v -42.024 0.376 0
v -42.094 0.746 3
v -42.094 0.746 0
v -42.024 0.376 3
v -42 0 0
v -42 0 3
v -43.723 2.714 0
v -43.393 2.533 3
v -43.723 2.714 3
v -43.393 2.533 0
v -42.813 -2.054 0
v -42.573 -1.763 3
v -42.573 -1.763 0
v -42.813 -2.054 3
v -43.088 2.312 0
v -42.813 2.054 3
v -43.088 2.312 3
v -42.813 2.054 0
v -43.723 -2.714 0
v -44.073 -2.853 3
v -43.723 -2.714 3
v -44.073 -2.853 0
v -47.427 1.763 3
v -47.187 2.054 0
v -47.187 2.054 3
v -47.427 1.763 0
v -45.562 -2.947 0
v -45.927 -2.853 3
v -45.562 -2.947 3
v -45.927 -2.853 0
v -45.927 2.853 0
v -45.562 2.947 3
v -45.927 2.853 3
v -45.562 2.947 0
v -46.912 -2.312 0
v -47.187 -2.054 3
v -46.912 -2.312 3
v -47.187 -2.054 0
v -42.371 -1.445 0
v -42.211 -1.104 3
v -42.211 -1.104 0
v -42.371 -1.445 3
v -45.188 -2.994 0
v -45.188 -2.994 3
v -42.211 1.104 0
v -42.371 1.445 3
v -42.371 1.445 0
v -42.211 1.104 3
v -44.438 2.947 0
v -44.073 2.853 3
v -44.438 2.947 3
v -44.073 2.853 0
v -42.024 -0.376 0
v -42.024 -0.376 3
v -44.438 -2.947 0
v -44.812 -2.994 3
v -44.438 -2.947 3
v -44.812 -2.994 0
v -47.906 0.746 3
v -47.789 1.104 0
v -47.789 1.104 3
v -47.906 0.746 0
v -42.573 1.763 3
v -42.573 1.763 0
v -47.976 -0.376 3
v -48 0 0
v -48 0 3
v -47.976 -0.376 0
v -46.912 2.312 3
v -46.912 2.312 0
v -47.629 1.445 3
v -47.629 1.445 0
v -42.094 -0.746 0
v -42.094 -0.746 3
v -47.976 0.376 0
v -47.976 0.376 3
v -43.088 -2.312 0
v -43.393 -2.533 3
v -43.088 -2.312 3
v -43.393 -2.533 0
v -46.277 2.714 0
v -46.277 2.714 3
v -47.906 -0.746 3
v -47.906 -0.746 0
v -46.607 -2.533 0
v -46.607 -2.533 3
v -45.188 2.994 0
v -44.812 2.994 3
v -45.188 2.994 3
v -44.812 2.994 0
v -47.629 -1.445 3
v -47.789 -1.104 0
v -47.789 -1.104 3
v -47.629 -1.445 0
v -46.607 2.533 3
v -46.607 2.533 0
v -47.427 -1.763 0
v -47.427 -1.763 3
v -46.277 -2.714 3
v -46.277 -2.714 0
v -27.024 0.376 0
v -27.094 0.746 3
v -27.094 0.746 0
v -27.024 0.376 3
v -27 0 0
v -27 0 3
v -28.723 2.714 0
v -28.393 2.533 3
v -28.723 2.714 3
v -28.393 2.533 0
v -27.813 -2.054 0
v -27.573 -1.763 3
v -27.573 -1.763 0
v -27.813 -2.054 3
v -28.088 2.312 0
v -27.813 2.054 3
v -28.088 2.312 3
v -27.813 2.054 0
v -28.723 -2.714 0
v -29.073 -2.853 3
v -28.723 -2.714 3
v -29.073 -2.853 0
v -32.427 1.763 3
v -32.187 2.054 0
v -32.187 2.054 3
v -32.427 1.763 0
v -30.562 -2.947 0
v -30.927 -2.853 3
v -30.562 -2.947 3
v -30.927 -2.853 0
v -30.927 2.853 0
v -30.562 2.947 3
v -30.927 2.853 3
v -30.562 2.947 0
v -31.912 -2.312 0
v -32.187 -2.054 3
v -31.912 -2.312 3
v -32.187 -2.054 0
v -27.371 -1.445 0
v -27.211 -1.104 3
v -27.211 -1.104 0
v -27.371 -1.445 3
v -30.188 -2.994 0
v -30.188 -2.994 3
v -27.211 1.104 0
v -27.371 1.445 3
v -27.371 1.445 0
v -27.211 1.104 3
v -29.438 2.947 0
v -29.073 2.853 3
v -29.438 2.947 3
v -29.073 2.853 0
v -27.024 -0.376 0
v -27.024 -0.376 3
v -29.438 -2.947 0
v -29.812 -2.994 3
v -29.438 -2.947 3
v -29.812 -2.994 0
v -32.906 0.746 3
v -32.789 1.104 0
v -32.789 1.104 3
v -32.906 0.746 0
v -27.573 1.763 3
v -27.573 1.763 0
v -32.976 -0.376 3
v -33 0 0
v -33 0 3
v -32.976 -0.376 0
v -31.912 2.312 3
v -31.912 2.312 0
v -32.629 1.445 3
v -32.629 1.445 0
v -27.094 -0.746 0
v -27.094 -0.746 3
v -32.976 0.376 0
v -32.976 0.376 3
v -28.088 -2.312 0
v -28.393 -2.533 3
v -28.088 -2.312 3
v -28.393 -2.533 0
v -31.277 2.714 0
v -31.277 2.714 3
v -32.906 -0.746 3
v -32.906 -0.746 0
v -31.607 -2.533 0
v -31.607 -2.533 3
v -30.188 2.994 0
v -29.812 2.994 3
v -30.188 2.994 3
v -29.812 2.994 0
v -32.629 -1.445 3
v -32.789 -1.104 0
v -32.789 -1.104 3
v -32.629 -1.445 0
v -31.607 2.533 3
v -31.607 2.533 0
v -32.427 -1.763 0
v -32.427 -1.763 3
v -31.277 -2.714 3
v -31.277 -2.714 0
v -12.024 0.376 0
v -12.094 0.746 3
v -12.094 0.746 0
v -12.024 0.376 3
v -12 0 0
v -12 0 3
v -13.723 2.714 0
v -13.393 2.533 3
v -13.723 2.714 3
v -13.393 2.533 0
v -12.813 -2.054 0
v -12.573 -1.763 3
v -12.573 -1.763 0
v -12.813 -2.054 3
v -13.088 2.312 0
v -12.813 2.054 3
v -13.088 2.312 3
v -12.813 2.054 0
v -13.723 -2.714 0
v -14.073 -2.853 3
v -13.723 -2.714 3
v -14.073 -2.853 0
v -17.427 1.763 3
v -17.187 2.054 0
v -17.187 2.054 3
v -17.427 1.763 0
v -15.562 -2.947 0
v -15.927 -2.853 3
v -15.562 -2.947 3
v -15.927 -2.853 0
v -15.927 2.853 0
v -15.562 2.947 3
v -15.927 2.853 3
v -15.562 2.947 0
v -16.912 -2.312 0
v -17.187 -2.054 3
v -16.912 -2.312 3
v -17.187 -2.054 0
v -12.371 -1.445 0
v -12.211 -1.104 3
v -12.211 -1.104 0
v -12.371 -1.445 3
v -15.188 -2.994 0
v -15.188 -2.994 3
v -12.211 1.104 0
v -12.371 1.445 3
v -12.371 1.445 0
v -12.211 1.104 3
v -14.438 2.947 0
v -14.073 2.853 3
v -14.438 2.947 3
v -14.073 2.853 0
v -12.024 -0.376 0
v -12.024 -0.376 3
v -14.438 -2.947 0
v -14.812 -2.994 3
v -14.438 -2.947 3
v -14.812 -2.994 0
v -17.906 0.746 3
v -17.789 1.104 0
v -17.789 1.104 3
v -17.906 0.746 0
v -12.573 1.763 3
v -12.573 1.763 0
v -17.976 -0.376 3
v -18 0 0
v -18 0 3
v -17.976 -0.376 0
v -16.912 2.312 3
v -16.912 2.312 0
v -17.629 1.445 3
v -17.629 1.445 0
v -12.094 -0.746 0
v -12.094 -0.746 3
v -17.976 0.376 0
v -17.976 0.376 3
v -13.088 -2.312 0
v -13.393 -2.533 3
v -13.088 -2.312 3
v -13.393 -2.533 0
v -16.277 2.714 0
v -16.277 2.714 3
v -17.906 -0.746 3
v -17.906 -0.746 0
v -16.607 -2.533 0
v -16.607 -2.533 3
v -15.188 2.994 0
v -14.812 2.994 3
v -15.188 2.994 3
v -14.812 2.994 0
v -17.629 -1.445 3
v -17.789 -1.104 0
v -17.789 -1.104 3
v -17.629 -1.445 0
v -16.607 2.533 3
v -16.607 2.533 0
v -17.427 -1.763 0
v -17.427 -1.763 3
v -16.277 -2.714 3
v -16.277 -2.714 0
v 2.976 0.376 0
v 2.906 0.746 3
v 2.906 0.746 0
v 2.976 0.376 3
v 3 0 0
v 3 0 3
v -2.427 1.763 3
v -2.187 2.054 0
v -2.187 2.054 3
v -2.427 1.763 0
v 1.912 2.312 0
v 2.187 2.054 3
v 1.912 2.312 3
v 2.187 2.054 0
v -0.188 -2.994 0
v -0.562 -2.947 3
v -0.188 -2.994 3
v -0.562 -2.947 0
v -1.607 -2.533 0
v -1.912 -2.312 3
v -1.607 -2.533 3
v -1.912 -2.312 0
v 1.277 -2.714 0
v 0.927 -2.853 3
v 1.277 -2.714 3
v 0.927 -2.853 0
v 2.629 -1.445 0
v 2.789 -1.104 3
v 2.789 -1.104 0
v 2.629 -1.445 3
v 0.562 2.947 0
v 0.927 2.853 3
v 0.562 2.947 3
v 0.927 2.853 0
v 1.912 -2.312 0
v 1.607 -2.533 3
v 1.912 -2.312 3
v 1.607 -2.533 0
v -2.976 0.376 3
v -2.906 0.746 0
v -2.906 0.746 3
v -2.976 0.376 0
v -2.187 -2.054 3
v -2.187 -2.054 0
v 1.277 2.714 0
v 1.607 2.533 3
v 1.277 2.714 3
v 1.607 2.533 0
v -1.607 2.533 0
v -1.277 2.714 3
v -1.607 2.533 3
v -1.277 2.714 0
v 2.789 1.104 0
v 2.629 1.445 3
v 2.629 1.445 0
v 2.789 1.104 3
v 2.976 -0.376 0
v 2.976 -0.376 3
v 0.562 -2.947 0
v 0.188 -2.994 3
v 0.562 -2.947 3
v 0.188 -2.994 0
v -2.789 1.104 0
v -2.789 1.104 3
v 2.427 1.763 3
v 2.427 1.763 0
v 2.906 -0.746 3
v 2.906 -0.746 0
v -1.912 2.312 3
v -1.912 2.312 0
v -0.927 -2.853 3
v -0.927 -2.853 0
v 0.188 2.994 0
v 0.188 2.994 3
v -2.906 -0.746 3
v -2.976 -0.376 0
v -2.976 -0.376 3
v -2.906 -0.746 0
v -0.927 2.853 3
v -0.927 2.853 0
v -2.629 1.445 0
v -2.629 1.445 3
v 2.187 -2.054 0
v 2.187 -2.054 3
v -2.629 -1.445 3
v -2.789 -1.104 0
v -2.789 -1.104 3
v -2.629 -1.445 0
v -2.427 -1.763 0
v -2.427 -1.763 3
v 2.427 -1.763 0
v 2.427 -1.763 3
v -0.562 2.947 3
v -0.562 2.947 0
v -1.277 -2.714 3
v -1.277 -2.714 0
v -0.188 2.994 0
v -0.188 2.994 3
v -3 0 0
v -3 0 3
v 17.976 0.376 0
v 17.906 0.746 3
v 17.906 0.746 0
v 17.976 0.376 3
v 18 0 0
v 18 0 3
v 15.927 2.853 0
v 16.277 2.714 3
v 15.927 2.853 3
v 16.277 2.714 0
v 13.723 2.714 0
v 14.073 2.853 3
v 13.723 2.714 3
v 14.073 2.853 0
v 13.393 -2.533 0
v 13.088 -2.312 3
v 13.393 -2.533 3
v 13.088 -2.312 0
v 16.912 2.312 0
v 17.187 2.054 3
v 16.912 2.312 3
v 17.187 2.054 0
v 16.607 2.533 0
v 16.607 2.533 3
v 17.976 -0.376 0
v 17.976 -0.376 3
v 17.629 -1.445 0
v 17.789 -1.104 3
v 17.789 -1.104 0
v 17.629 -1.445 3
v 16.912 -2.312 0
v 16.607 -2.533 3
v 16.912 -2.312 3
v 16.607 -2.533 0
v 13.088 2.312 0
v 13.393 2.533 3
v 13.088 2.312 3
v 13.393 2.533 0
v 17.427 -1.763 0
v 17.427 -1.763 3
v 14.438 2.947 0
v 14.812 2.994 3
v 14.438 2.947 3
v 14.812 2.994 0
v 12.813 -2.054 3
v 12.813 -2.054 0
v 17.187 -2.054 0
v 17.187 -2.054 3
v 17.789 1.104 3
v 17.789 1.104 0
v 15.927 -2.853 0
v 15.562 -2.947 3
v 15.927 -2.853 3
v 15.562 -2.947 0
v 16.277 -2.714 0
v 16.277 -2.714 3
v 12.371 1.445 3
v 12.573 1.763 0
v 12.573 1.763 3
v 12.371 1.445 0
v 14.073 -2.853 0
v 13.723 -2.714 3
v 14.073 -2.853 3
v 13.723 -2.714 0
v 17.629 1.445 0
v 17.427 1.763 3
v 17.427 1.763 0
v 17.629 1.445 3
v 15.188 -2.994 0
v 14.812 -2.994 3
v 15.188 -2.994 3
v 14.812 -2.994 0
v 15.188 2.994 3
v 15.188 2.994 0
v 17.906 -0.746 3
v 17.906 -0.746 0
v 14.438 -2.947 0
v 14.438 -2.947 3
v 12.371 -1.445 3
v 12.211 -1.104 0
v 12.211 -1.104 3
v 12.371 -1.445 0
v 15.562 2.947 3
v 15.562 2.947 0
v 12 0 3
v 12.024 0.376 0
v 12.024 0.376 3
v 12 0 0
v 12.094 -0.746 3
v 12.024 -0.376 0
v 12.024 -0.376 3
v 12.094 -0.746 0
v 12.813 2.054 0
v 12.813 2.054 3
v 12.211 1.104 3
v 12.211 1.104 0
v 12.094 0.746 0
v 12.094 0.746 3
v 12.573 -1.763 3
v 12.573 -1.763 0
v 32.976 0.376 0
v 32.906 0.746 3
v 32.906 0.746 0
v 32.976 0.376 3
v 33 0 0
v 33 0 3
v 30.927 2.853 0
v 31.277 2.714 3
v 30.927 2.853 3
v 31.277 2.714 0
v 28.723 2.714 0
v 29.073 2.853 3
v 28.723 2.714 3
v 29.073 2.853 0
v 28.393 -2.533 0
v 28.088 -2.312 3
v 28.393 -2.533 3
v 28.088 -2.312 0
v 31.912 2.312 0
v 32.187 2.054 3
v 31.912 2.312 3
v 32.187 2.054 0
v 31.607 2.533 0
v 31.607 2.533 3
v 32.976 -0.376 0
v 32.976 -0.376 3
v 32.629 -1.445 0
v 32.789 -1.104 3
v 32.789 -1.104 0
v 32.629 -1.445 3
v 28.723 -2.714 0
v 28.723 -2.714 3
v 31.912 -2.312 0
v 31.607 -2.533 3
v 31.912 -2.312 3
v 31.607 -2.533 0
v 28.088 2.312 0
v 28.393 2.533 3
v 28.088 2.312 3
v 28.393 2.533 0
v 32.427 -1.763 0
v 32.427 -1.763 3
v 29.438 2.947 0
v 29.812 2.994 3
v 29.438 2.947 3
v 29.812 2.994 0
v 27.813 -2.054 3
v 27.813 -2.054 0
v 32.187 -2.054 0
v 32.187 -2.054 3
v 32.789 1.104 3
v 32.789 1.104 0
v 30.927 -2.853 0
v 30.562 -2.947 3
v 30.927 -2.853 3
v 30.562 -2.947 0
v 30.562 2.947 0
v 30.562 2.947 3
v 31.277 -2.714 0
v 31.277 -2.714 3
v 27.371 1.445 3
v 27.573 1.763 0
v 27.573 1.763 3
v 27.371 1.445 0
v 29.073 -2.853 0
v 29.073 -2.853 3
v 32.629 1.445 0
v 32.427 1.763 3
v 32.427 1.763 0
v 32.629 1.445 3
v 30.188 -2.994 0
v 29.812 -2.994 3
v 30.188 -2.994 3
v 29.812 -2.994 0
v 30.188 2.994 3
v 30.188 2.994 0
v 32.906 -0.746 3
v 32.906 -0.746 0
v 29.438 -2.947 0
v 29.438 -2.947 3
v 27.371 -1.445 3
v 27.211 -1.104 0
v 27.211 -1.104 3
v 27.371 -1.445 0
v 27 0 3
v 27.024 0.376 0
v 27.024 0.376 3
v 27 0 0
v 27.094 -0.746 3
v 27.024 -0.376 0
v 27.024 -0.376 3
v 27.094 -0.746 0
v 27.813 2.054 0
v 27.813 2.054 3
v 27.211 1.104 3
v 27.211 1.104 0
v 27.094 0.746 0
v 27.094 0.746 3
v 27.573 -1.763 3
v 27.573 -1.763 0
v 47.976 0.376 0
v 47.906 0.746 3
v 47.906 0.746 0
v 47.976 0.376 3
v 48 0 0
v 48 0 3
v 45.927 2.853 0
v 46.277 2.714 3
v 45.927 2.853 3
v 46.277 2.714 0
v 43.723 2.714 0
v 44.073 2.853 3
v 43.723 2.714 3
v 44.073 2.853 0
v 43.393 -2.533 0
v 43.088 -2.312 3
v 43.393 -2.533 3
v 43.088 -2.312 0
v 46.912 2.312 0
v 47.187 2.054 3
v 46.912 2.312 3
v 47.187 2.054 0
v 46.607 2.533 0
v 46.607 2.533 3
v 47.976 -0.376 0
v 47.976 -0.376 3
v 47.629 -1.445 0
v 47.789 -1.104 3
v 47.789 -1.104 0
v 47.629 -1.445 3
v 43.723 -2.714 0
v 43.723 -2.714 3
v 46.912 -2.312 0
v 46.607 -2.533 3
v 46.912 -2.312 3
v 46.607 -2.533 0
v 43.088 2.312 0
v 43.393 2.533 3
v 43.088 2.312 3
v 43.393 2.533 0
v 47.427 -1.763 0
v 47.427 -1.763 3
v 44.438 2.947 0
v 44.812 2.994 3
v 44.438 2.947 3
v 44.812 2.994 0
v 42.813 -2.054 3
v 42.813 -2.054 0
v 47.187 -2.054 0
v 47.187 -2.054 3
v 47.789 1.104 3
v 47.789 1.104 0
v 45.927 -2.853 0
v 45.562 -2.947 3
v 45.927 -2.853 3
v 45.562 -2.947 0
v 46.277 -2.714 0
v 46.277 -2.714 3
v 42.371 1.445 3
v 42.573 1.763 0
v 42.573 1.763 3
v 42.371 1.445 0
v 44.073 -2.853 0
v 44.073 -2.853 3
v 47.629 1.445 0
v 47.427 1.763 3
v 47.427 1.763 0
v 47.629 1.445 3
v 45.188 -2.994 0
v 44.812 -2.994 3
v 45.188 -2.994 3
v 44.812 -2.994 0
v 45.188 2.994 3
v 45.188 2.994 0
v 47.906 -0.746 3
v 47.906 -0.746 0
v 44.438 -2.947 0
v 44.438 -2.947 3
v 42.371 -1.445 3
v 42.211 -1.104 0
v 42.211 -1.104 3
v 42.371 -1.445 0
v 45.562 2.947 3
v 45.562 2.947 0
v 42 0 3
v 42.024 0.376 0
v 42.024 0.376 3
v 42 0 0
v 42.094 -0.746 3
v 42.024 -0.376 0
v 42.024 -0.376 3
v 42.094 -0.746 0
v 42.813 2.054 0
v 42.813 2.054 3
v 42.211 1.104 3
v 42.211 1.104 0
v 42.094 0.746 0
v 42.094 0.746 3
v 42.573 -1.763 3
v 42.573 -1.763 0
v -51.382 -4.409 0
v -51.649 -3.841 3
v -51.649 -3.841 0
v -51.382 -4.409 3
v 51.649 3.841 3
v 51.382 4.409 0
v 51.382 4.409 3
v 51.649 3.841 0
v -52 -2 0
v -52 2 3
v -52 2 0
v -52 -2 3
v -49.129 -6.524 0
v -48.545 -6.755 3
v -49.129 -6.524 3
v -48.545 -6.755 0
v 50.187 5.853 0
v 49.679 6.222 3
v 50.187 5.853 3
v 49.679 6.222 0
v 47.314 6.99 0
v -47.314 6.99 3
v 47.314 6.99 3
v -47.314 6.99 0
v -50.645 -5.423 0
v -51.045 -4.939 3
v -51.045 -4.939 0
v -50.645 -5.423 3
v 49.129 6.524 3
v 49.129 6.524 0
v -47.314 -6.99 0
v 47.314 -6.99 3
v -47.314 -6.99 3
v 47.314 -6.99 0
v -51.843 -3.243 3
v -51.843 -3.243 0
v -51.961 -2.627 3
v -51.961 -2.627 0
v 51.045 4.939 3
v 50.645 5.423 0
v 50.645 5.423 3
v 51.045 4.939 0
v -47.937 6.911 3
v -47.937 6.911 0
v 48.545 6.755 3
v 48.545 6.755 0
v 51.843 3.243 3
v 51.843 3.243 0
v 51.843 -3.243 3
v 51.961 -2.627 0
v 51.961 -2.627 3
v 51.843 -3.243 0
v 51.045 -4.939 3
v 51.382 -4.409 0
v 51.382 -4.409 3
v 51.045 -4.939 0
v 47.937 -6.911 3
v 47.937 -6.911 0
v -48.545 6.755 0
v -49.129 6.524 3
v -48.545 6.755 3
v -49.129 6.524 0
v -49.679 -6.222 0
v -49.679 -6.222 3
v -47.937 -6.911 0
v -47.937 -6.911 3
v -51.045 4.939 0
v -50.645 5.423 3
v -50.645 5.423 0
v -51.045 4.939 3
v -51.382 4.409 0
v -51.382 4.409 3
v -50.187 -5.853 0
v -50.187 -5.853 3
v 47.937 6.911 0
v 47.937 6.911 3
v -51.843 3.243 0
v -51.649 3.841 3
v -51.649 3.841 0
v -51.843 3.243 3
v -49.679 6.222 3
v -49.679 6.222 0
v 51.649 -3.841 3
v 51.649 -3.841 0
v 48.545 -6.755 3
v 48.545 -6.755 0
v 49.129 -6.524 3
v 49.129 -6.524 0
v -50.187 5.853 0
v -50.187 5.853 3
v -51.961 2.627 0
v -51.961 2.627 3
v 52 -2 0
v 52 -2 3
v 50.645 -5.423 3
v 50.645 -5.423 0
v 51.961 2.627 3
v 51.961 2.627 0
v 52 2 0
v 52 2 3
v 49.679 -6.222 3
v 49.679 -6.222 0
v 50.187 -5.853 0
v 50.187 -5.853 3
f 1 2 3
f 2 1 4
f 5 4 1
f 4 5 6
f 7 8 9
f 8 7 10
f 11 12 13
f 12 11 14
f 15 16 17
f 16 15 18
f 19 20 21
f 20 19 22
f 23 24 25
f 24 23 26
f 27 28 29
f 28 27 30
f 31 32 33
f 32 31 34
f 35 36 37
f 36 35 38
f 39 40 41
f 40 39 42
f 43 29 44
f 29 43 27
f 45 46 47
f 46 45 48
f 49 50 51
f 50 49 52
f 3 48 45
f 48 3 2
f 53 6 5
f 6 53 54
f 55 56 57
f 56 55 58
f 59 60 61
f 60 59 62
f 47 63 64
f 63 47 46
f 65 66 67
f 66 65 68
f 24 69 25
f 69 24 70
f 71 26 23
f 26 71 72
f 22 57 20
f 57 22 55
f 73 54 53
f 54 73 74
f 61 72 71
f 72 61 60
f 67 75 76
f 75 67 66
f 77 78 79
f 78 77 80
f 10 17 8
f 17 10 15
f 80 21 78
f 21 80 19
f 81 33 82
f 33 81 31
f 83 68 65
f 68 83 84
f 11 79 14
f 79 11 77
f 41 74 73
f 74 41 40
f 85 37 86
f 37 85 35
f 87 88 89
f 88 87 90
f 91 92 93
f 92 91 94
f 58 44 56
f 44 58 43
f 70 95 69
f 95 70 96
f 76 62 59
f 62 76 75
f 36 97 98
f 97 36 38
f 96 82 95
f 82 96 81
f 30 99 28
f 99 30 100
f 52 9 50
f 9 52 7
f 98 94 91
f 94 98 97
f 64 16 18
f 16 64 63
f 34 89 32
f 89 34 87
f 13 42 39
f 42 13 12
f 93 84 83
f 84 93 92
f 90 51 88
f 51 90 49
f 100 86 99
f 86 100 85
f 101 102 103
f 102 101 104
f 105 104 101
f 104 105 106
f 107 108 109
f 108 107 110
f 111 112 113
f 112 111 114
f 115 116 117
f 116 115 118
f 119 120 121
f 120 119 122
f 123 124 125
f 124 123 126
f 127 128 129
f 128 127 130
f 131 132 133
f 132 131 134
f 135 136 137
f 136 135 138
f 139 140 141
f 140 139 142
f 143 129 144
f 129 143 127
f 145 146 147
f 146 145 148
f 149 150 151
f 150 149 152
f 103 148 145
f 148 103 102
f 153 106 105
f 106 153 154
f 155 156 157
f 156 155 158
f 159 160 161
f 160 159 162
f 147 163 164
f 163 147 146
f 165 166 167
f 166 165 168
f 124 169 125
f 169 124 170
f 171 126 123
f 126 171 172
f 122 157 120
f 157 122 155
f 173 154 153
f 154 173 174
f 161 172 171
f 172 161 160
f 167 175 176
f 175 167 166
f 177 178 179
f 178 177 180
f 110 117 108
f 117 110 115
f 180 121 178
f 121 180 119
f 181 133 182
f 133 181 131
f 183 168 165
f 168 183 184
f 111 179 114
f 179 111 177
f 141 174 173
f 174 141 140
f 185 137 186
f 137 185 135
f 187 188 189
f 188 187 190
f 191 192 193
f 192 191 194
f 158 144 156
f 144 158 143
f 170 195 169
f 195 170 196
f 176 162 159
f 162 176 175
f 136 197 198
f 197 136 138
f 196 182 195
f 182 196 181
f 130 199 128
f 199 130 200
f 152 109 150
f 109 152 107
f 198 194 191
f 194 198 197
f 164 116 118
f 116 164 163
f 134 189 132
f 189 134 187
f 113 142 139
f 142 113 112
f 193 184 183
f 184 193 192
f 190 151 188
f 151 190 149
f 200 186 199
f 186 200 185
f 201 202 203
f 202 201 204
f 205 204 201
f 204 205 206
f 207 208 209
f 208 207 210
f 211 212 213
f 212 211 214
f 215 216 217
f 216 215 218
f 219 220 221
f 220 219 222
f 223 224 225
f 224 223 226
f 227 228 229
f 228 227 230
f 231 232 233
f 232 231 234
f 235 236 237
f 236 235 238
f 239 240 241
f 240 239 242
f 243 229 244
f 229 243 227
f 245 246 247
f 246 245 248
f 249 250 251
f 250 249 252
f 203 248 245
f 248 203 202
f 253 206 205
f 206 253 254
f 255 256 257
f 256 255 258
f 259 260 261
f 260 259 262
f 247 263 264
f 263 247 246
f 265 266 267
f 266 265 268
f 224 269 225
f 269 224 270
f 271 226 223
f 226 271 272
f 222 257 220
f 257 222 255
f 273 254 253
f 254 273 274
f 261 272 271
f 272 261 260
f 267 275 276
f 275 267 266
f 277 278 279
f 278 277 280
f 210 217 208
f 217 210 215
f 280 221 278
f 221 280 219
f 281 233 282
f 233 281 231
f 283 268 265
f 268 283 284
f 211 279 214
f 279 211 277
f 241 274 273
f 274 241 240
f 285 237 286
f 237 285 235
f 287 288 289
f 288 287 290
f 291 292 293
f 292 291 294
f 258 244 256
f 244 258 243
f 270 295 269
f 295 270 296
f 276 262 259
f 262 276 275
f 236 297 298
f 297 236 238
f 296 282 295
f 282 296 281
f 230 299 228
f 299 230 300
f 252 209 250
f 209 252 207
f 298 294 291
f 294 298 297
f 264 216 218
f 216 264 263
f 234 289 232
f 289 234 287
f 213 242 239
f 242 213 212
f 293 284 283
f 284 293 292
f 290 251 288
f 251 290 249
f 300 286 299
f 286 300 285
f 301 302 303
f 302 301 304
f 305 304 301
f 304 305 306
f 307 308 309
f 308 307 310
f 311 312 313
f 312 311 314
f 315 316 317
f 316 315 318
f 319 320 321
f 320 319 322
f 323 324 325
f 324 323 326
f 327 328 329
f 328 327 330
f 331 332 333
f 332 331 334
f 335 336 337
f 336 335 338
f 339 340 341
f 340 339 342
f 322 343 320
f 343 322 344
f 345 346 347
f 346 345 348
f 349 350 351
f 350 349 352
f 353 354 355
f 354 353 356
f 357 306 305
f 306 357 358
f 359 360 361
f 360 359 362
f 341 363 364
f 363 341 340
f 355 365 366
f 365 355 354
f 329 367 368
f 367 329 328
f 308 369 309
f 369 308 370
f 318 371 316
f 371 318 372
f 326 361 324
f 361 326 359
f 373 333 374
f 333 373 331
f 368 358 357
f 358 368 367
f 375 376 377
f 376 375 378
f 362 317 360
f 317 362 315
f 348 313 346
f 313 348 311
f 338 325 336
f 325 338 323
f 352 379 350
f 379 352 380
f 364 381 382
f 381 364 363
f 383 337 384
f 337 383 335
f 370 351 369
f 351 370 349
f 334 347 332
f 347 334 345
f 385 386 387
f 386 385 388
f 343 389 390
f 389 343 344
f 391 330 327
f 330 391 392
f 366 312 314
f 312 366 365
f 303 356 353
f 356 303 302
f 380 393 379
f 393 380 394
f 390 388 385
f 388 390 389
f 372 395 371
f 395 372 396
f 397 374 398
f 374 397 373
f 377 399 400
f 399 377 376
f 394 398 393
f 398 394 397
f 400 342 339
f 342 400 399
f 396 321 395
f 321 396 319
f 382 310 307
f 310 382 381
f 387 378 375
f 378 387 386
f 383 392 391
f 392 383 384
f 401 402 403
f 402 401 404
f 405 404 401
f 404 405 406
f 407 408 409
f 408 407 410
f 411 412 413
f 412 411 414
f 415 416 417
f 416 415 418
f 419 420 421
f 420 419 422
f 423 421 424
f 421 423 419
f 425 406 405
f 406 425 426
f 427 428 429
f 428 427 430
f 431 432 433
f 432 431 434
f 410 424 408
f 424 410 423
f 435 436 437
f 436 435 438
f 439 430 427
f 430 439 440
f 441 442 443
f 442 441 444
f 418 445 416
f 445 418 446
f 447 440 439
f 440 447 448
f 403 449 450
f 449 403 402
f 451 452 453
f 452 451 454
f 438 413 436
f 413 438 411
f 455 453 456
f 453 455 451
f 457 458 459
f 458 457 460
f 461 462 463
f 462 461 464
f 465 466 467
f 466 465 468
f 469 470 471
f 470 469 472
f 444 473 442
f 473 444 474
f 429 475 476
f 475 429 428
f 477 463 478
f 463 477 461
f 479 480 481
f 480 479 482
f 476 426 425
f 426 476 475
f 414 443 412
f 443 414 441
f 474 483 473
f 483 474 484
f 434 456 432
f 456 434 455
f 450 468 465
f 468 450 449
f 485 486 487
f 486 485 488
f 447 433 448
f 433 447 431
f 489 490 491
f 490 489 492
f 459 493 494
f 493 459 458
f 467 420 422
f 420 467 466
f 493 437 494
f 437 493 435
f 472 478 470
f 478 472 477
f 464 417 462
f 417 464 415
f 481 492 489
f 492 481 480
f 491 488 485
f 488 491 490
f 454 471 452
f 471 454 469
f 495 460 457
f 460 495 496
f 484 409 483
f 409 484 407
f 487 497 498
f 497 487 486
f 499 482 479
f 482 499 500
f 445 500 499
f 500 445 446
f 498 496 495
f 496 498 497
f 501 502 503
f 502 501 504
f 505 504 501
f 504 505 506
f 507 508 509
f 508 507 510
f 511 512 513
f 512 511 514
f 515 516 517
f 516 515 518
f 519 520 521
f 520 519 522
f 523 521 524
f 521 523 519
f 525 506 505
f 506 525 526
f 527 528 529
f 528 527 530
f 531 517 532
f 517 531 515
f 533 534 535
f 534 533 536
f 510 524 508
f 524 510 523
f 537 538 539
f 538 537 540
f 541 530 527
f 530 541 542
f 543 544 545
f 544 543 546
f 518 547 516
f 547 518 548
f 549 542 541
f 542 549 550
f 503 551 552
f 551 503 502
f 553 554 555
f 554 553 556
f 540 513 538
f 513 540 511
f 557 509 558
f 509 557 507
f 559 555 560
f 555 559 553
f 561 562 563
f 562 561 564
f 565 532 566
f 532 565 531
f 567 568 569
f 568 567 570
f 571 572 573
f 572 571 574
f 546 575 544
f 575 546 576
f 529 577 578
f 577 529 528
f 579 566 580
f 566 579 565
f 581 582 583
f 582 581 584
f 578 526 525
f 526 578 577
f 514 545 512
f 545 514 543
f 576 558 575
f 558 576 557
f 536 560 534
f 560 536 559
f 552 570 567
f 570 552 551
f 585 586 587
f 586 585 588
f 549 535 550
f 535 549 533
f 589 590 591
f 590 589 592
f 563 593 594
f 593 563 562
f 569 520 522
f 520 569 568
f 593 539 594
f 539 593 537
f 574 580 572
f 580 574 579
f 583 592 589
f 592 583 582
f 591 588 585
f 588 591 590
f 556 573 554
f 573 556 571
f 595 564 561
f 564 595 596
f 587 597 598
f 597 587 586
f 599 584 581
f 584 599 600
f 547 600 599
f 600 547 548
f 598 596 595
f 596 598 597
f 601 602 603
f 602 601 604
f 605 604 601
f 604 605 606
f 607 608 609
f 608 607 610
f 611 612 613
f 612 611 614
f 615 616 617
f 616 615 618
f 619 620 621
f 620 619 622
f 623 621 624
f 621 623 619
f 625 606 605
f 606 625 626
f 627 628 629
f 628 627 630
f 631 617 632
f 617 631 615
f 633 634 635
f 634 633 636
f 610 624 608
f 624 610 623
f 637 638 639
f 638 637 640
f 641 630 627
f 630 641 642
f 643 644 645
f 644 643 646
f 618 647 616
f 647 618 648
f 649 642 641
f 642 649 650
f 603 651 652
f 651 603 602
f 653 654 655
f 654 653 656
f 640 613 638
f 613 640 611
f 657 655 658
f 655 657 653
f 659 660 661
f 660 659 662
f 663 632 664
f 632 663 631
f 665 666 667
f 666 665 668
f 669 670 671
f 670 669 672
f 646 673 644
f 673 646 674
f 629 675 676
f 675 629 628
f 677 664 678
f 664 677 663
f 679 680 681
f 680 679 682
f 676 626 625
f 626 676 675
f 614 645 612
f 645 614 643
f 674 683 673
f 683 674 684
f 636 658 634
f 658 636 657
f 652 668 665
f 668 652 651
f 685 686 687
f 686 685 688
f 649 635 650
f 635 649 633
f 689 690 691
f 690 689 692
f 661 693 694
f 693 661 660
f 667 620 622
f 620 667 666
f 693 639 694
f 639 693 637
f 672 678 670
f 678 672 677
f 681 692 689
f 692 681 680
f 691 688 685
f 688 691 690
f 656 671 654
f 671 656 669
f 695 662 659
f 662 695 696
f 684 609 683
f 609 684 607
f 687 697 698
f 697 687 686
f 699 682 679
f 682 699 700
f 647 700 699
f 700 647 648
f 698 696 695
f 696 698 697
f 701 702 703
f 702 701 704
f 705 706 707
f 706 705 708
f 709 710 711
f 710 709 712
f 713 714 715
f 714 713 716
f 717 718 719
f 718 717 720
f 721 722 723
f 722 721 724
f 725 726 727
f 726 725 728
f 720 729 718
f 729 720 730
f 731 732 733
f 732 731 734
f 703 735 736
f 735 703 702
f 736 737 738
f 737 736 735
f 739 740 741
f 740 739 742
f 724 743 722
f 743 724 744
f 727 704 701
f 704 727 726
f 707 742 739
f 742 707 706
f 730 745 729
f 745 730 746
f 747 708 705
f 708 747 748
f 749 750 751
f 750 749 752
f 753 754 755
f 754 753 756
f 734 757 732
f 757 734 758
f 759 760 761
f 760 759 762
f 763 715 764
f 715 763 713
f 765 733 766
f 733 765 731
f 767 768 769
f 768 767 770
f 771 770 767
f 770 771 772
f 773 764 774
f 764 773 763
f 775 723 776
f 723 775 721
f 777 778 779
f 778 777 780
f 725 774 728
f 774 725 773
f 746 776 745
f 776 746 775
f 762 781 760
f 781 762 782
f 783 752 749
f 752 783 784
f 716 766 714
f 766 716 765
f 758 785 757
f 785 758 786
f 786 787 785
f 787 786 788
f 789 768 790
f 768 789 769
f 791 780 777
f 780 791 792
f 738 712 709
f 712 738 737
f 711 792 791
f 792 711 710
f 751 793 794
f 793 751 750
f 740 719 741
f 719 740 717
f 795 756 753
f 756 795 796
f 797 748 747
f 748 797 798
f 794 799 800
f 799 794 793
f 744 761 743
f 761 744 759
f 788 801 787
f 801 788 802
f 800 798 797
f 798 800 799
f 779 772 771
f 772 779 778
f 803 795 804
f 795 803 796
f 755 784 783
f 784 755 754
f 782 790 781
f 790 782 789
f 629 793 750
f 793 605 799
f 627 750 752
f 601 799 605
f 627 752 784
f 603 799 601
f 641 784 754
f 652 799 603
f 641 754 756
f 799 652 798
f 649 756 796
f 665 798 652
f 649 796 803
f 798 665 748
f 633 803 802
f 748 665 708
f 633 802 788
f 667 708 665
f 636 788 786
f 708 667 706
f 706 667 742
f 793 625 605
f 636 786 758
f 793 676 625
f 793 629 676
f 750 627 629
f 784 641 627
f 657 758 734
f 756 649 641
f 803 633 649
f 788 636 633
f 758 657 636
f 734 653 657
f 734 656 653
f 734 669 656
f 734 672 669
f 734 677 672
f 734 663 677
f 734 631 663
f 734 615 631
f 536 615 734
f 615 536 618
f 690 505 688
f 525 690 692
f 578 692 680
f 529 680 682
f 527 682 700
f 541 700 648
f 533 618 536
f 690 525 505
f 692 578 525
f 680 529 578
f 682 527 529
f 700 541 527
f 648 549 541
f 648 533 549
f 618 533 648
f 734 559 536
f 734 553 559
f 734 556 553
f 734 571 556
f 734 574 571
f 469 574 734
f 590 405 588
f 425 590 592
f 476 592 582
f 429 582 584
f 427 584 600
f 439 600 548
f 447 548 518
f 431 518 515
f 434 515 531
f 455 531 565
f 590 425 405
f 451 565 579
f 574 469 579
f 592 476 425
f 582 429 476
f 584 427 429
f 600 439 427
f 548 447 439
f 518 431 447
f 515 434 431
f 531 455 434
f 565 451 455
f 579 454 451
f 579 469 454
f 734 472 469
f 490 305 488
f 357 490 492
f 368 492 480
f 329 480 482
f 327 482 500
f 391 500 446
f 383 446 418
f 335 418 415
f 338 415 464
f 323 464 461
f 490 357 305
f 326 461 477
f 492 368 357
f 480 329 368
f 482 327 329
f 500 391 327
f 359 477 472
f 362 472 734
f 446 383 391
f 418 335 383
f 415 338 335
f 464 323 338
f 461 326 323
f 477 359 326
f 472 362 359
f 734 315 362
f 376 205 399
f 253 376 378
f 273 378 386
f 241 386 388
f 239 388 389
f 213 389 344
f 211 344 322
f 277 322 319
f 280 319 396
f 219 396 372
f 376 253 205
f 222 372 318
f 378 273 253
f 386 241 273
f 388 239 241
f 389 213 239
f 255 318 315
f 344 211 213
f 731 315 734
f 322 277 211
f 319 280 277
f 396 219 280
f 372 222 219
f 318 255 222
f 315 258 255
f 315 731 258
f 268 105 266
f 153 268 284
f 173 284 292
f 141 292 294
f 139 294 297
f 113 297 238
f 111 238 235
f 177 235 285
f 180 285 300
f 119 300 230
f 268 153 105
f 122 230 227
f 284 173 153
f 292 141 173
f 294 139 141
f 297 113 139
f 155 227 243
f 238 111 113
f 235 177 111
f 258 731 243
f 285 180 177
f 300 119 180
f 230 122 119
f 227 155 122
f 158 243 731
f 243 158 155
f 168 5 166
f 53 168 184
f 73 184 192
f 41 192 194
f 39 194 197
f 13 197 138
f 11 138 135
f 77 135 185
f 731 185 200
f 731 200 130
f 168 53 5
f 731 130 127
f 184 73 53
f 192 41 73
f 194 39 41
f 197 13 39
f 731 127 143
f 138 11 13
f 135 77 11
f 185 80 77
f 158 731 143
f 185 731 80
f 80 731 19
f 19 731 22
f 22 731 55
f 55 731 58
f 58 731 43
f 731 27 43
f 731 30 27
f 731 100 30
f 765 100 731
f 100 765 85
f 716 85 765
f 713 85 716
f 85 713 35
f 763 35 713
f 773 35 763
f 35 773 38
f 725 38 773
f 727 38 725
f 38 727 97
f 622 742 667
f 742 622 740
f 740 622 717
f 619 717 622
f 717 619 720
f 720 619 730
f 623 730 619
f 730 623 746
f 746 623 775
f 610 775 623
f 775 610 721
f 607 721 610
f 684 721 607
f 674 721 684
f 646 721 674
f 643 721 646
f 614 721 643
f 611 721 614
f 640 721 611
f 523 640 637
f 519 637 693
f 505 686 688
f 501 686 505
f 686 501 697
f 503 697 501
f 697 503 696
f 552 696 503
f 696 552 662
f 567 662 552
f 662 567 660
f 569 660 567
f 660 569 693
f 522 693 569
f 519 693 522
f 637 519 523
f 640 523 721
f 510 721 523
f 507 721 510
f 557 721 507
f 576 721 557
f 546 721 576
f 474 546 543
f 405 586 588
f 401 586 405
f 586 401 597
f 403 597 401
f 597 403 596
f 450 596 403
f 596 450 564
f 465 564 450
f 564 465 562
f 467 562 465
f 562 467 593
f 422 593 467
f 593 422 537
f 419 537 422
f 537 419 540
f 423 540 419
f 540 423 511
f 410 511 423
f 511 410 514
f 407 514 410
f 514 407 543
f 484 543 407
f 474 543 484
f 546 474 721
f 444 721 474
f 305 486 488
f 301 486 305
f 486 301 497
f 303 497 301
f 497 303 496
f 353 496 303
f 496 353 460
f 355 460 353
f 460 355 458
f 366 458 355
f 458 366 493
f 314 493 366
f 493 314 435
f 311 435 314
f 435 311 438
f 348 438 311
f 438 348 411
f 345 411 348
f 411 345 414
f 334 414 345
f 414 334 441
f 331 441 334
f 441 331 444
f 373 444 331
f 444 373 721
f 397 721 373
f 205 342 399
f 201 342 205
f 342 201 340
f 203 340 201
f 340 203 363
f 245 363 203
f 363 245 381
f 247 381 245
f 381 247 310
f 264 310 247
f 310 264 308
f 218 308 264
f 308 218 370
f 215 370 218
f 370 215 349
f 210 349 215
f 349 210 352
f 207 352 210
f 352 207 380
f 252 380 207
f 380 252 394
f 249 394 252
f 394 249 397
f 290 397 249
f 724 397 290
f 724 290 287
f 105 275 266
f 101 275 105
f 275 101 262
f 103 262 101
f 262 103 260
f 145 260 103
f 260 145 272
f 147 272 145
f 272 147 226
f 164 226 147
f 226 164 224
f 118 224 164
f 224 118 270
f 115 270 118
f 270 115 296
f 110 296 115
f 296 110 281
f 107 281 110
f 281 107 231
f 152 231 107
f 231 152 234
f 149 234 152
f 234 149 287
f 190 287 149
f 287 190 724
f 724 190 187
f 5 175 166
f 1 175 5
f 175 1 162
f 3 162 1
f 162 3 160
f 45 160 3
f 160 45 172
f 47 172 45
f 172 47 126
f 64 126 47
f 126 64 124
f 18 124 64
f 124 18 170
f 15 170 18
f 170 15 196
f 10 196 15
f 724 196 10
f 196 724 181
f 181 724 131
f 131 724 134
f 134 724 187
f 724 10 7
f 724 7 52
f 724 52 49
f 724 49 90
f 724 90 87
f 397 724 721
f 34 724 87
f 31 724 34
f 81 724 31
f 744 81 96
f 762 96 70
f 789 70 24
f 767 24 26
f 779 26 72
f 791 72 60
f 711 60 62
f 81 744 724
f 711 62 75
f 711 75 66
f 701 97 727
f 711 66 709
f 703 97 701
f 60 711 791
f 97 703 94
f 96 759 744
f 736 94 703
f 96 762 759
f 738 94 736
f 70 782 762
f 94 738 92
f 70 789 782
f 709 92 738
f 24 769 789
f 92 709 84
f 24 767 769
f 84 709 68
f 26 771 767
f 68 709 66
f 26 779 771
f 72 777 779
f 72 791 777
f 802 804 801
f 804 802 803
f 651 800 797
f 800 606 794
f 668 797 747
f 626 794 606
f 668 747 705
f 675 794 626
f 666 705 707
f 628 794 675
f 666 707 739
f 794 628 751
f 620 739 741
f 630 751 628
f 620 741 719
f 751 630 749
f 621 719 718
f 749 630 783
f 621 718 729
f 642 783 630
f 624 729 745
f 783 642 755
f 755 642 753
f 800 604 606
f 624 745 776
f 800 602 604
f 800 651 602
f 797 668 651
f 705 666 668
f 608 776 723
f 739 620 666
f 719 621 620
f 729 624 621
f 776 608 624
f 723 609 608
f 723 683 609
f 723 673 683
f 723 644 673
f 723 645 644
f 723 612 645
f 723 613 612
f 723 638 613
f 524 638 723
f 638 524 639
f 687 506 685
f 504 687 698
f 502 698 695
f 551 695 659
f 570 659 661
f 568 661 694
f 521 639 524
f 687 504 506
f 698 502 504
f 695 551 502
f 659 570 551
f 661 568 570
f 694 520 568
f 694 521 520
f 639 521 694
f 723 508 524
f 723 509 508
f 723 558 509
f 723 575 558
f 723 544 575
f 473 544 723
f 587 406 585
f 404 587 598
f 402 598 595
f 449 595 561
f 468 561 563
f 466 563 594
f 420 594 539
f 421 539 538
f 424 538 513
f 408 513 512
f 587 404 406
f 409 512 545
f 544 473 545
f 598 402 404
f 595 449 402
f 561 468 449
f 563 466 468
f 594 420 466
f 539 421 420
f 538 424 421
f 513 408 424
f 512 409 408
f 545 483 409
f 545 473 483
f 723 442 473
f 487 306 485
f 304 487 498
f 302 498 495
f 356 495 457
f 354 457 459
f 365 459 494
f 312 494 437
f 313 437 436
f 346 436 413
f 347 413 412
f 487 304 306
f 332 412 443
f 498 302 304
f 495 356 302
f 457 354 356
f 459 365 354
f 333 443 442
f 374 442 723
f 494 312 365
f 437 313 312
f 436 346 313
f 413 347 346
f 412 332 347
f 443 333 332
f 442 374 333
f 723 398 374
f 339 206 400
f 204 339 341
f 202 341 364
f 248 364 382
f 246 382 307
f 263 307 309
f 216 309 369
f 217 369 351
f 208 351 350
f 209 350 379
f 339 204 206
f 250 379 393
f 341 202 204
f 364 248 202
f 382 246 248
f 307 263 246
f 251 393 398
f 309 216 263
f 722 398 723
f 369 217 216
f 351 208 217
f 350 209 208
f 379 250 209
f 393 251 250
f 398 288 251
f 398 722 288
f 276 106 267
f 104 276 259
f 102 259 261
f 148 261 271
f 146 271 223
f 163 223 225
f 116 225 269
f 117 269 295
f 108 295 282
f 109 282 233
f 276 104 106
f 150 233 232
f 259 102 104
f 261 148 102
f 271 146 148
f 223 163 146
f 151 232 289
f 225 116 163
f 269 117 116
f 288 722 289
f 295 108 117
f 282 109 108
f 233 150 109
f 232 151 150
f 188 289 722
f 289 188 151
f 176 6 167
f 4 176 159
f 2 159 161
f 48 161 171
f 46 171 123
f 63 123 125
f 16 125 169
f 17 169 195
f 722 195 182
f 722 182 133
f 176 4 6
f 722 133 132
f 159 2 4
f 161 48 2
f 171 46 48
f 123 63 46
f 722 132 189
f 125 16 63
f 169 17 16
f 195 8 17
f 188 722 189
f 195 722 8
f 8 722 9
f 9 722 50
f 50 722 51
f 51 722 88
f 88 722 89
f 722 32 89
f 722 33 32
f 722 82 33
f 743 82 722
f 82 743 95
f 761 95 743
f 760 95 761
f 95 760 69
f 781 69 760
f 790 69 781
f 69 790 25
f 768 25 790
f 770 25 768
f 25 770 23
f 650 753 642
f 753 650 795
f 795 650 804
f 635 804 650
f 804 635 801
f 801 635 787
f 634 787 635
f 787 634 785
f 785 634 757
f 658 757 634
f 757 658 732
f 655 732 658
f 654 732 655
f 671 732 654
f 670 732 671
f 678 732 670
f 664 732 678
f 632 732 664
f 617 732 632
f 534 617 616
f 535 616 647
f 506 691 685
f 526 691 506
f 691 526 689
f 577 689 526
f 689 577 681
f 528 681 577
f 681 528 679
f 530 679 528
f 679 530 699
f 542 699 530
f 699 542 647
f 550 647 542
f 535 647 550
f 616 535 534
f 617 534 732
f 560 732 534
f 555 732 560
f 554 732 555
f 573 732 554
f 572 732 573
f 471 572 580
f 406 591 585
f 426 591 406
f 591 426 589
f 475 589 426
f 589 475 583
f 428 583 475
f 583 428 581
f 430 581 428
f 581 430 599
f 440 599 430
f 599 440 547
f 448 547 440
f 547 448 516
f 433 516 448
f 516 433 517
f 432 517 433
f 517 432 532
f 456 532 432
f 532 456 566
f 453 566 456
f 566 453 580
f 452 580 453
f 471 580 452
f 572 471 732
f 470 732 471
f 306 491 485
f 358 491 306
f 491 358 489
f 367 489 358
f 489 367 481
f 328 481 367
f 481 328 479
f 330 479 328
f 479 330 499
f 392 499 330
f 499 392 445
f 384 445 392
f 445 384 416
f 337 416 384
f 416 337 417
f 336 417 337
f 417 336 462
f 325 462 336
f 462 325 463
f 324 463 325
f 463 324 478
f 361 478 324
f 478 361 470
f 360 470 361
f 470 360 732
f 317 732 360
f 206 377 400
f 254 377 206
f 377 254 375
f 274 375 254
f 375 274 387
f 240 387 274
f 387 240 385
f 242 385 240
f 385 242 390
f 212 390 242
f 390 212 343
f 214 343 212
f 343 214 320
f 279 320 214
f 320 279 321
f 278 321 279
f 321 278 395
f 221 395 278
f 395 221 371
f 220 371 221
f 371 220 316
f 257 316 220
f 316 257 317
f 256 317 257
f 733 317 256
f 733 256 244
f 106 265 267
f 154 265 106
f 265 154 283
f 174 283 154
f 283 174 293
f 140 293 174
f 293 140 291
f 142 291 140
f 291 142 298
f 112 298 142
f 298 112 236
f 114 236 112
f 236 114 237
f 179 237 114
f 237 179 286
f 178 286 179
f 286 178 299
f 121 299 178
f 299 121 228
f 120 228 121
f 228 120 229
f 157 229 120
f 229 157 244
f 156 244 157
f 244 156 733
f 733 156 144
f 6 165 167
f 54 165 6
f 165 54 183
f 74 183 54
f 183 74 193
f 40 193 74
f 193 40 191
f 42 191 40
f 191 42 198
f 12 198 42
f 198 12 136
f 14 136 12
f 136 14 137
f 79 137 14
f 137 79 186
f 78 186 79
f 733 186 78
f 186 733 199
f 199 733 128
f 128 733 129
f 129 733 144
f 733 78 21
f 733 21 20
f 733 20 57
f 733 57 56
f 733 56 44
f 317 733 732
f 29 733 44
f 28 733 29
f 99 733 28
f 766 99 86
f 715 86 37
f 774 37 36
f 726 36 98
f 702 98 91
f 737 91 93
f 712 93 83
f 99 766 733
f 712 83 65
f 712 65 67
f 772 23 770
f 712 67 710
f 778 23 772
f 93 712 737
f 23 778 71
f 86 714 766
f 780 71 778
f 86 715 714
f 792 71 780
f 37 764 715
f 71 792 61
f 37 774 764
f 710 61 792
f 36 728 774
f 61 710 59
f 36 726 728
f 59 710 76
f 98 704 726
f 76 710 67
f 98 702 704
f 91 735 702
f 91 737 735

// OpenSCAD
// Generated by SolidPython 1.1.3 on 2023-03-12 22:44:07
$fn = 50;


difference() {
	union() {
		translate(v = [0, 0, 0]) {
			rotate(a = [0, 0, 0]) {
				hull() {
					translate(v = [-47.0000000000, 2.0000000000, 0]) {
						rotate(a = [0, 0, 0]) {
							translate(v = [0, 0, 0]) {
								rotate(a = [0, 0, 0]) {
									cylinder(h = 3, r = 5);
								}
							}
						}
					}
					translate(v = [47.0000000000, 2.0000000000, 0]) {
						rotate(a = [0, 0, 0]) {
							translate(v = [0, 0, 0]) {
								rotate(a = [0, 0, 0]) {
									cylinder(h = 3, r = 5);
								}
							}
						}
					}
					translate(v = [-47.0000000000, -2.0000000000, 0]) {
						rotate(a = [0, 0, 0]) {
							translate(v = [0, 0, 0]) {
								rotate(a = [0, 0, 0]) {
									cylinder(h = 3, r = 5);
								}
							}
						}
					}
					translate(v = [47.0000000000, -2.0000000000, 0]) {
						rotate(a = [0, 0, 0]) {
							translate(v = [0, 0, 0]) {
								rotate(a = [0, 0, 0]) {
									cylinder(h = 3, r = 5);
								}
							}
						}
					}
				}
			}
		}
	}
	union() {
		translate(v = [-45.0000000000, 0.0000000000, 0]) {
			rotate(a = [0, 0, 0]) {
				translate(v = [0, 0, -50]) {
					rotate(a = [0, 0, 0]) {
						cylinder(h = 100, r = 3.0000000000);
					}
				}
			}
		}
		translate(v = [-30.0000000000, 0.0000000000, 0]) {
			rotate(a = [0, 0, 0]) {
				translate(v = [0, 0, -50]) {
					rotate(a = [0, 0, 0]) {
						cylinder(h = 100, r = 3.0000000000);
					}
				}
			}
		}
		translate(v = [-15.0000000000, 0.0000000000, 0]) {
			rotate(a = [0, 0, 0]) {
				translate(v = [0, 0, -50]) {
					rotate(a = [0, 0, 0]) {
						cylinder(h = 100, r = 3.0000000000);
					}
				}
			}
		}
		translate(v = [0.0000000000, 0.0000000000, 0]) {
			rotate(a = [0, 0, 0]) {
				translate(v = [0, 0, -50]) {
					rotate(a = [0, 0, 0]) {
						cylinder(h = 100, r = 3.0000000000);
					}
				}
			}
		}
		translate(v = [15.0000000000, 0.0000000000, 0]) {
			rotate(a = [0, 0, 0]) {
				translate(v = [0, 0, -50]) {
					rotate(a = [0, 0, 0]) {
						cylinder(h = 100, r = 3.0000000000);
					}
				}
			}
		}
		translate(v = [30.0000000000, 0.0000000000, 0]) {
			rotate(a = [0, 0, 0]) {
				translate(v = [0, 0, -50]) {
					rotate(a = [0, 0, 0]) {
						cylinder(h = 100, r = 3.0000000000);
					}
				}
			}
		}
		translate(v = [45.0000000000, 0.0000000000, 0]) {
			rotate(a = [0, 0, 0]) {
				translate(v = [0, 0, -50]) {
					rotate(a = [0, 0, 0]) {
						cylinder(h = 100, r = 3.0000000000);
					}
				}
			}
		}
	}
}
/***********************************************
*********      SolidPython code:      **********
************************************************
 
from solid import *
import os
import subprocess

import oomB

import opsc_library_gen

mode = "laser"
#mode = "3d_print"

defined_objects = {}

radius_dict = {}
countersunk_dict = {}


def set_mode(m):
    global mode
    mode = m
    radius_dict['M6'] = 6.5/2
    radius_dict['M3'] = 3.3/2
    if mode == "laser":
        radius_dict['M6'] = 6/2
        radius_dict['M3'] = 3/2

    countersunk_dict['M3'] = {}
    countersunk_dict['M3']['little_rad'] = radius_dict['M3']
    countersunk_dict['M3']['big_rad'] = (5.5+0.6)/2
    if mode == "laser":
        countersunk_dict['M3']['big_rad'] = (4.75+0.6)/2
        countersunk_dict['M3']['little_rad'] = (4.75+0.6)/2

    countersunk_dict['M3']['height'] = 1.7


def opsc_make_object(filename, objects, save_type="none",resolution=50, layers = 1, tilediff = 200, mode="laser", overwrite=True):
    if overwrite or not os.path.exists(filename):
        set_mode(mode)
        save_type = save_type.lower()
        os.makedirs(os.path.dirname(filename), exist_ok=True)
        final_object = opsc_get_object(objects, mode = mode)
        # Save the final object to the specified filename    
        scad_render_to_file(final_object, filename, file_header='$fn = %s;' % resolution, include_orig_code=True)
        if mode == "laser":
            filename_laser = filename.replace(".scad","-flat.scad")
            scad_render_to_file(getLaser(final_object, layers=layers, tilediff=tilediff), filename_laser, file_header='$fn = %s;' % resolution, include_orig_code=True)
            if save_type == "all":
                saveToAll(filename_laser)
            elif save_type == "dxf":
                saveToDxf(filename_laser)
        if save_type == "all":
            saveToAll(filename)
        elif save_type == "dxf":
            saveToDxf(filename)


def opsc_get_object(objects, mode = "laser"):
    # Create the solidpython objects only include the positive objects and if they don't have inclusion or their inclusion is either all or mode
    # Initialize an empty list to store the results
    positive_objects = []

    # Iterate over the "objects" list
    for obj in objects:
        # Check if the current object has a "type" key with a value of "positive"
        if obj['type'] == 'positive':
            # Check if the current object has an "inclusion" key and its value matches "mode",
            # or if the current object does not have an "inclusion" key at all
            if not 'inclusion' in obj or obj['inclusion'] == "all" or obj['inclusion'] == mode:
                # Call the "get_opsc_item" function with the current object as an argument
                opsc_item = get_opsc_item(obj)
                # Add the result to the "positive_objects" list
                positive_objects.append(opsc_item)
# Initialize an empty list to store the results
    negative_objects = []

    # Iterate over the "objects" list
    for obj in objects:
        # Check if the current object has a "type" key with a value of "negative"
        if obj['type'] == 'negative':
            # Check if the current object has an "inclusion" key and its value matches "mode",
            # or if the current object does not have an "inclusion" key at all
            if not 'inclusion' in obj or obj['inclusion'] == "all" or obj['inclusion'] == mode:
                # Call the "get_opsc_item" function with the current object as an argument
                opsc_item = get_opsc_item(obj)
                # Add the result to the "negative_objects" list
                negative_objects.append(opsc_item)
    
    #positive_objects = [get_opsc_item(obj) for obj in objects if obj['type'] == 'positive']
    #negative_objects = [get_opsc_item(obj) for obj in objects if obj['type'] == 'negative']
    # Union the positive objects
    positive_object = union()(*positive_objects)
    # Union the negative objects
    negative_object = union()(*negative_objects)
    # Create the final object by subtracting the negative objects from the positive objects
    return difference()(positive_object, negative_object)

def get_opsc_item(params):
    # A dictionary to map radius string values to numerical values
    #radius_dict = {'small': 5, 'medium': 10, 'large': 15}
    # An array of function names for basic shapes
    basic_shapes = ['cube', 'sphere', 'cylinder']
    
    # An array of function names for other shapes
    other_shapes = ['hole', 'slot', 'rounded_rectangle', 'countersunk']
    


    # Convert radius to r if present, and remove radius from the params dictionary
    if 'radius' in params:
        if isinstance(params['radius'], str):
            # Use the radius_dict to map the radius string value to a numerical value
            params['r'] = radius_dict[params['radius']]
        else:
            params['r'] = params['radius']
        del params['radius']
    

    # Check if the object type is a basic shape
    if params['shape'] in basic_shapes:
        # Remove shape and unexpected dictionary values
        allowed_keys = {'size', 'r', 'r1', 'r2', 'd', 'h', 'rw', 'rh', 'dw', 'dh'}
        shape_params = {k: v for k, v in params.items() if k in allowed_keys}

        # Call the corresponding function for the shape parameter, using ** notation to pass the shape_params dictionary as keyword arguments
        return get_opsc_transform(params,globals()[params['shape']](**shape_params))
    
    # If the object type is not a basic shape, check if it's a defined object or one of the other shapes
    elif params['shape'] in other_shapes:
        # Call the corresponding function for the shape parameter, passing the params dictionary as an argument
        p2 = copy.deepcopy(params)
        p2["pos"] = [0,0,0]
        return get_opsc_transform(params,globals()[params['shape']](p2))
    
    # If the object is not a basic shape or a defined object, try to import it from a .scad file
    else:
        obj = defined_objects[params['shape']]
        return get_opsc_transform(params,obj)

def get_opsc_transform(params, solid_obj):
    # Rotate the object based on the 'rot' field in the params dictionary, or the 'rotX', 'rotY', and 'rotZ' fields if 'rot' is not present
    rot = params.get('rot', [])
    if rot:
        rotX, rotY, rotZ = rot
    else:
        rotX = params.get('rotX', 0)
        rotY = params.get('rotY', 0)
        rotZ = params.get('rotZ', 0)
    solid_obj = rotate([rotX, rotY, rotZ])(solid_obj)

    # Translate the object based on the 'pos' field in the params dictionary, or the 'x', 'y', and 'z' fields if 'pos' is not present
    pos = params.get('pos', [])
    if pos:
        x, y, z = pos
    else:
        x = params.get('x', 0)
        y = params.get('y', 0)
        z = params.get('z', 0)
    solid_obj = translate([x, y, z])(solid_obj)
    return solid_obj


import random

def opsc_easy_array(type, shape, repeats, pos_start, shift_arr, **kwargs):
    for i in range(0,3):
        repeats.append(1)
        pos_start.append(0)
        shift_arr.append(0)
    return_objects = []

    for x in range(0,repeats[0]):
        for y in range(0,repeats[1]):
            for z in range(0,repeats[2]):
                return_objects.append(opsc_easy(type, shape, pos=[pos_start[0]+x*shift_arr[0],pos_start[1]+y*shift_arr[1],pos_start[2]+z*shift_arr[2]], **kwargs))
    return return_objects                



def opsc_easy(type, shape, **kwargs):
    obj = {
        'type': type,
        'shape': shape
    }
    for param in ['size', 'r', 'r1', 'r2', 'd', 'h', 'rw', 'rh', 'dw', 'dh', 'pos', 'x', 'y', 'z', 'rot', 'rotX', 'rotY', 'rotZ', "w", "inclusion"]:
        if param in kwargs:
            obj[param] = kwargs[param]
    return obj

def hole(params):
    p2 = copy.deepcopy(params)  
    # Check if the radius is a string and replace it with the corresponding value from the dictionary
    if isinstance(p2['r'], str):
        p2['r'] = radius_dict[p2['r']]
    
    # Set the height to 100 if not specified
    if 'h' not in p2:
        p2['h'] = 100
        p2["pos"] = [0,0,-50]
    p2["center"] = True
    # Create the cylinder object
    p2["shape"] = "cylinder"
    p2["type"] = "positive"

    return get_opsc_item(p2)

import copy

def countersunk(params):
    p2 = copy.deepcopy(params)
    counter_rad = p2['r']
    p2['r'] = radius_dict[p2['r']]
    hp = copy.deepcopy(p2)
    hp["type"] = "positive"
    hp["shape"] = "hole"
    del hp["rot"]
    hol = get_opsc_item(hp)
    
    cp = copy.deepcopy(p2)
    cp["h"] = countersunk_dict[counter_rad]["height"]
    cp["r2"] = countersunk_dict[counter_rad]["little_rad"]
    cp["r1"] = countersunk_dict[counter_rad]["big_rad"]
    del cp["r"]
    del cp["rot"]
    cp["type"] = "positive"
    cp["shape"] = "cylinder"
    cp["pos"] = [0,0,0]

    top = get_opsc_item(cp)
    return union()(hol,top)



def slot(params):  
    p2 = copy.deepcopy(params) 
    if isinstance(p2['r'], str):
        p2['r'] = radius_dict[p2['r']]
    p2["type"] = "positive"
    p2["shape"] = "hole"
    del p2["rot"]
    p2["pos"] = [0,0,0]
    left = copy.deepcopy(p2)
    right = copy.deepcopy(p2)
    left["pos"][0] = p2["w"] / 2 - p2["r"] 
    
    right["pos"][0] = -p2["w"] / 2 + p2["r"] 
    pass
    leftObj = get_opsc_item(left)
    rightObj = get_opsc_item(right)
    return hull()(leftObj, rightObj)

def rounded_rectangle(params):   
    p2 = copy.deepcopy(params) 
    p2["h"] = p2["size"][2]
    p2["pos"] = p2.get("pos", [0, 0, 0]) 
    p2["type"] = "positive"
    p2["shape"] = "hole"
    p2["pos"] = [0,0,0]
    
    if 'rot' in p2:
        del p2["rot"]   
    if 'r' not in p2:
        p2["r"] = 5 
    tl = copy.deepcopy(p2)
    tr = copy.deepcopy(p2)
    bl = copy.deepcopy(p2)
    br = copy.deepcopy(p2)
    tl["pos"][0] = -(p2["size"][0] - p2["r"]*2)/2
    tl["pos"][1] = (p2["size"][1] - p2["r"]*2)/2
    tr["pos"][0] = (p2["size"][0] - p2["r"]*2)/2
    tr["pos"][1] = (p2["size"][1] - p2["r"]*2)/2
    bl["pos"][0] = -(p2["size"][0] - p2["r"]*2)/2
    bl["pos"][1] = -(p2["size"][1] - p2["r"]*2)/2
    br["pos"][0] = (p2["size"][0] - p2["r"]*2)/2
    br["pos"][1] = -(p2["size"][1] - p2["r"]*2)/2
    del tl["size"]
    del tr["size"]
    del bl["size"]
    del br["size"]
    tlo = get_opsc_item(tl)
    tro = get_opsc_item(tr)
    blo = get_opsc_item(bl)
    bro = get_opsc_item(br)    
    return hull()(tlo, tro, blo, bro)



def import_scad_object(filename):
    # Import the .scad file and convert it to a solidpython object
    #filename = "parts"
    obj = import_scad(filename)
    return obj.main()
    


import os
import solid as solidpython

# A dictionary to store the defined objects


def load_scad_objects():
    opsc_library_gen.gen_library(defined_objects)

import random

def test(num_objects):
    objects = []
    for i in range(num_objects):
        # Choose a random shape
        #shape = random.choice(['cube', 'sphere', 'cylinder', 'hole', 'slot', "rounded_rectangle"])
        shape = random.choice(["rounded_rectangle"])

        # Choose a random type
        type = random.choice(['positive', 'negative'])
        
        # Create an empty object dictionary
        obj = {'shape': shape, 'type': type}
        
        # Set shape-specific parameters
        if obj['shape'] in ['cube']:
            obj['size'] =  [random.uniform(5, 15), random.uniform(5, 15), random.uniform(5, 15)]
        if obj['shape'] in ['rounded_rectangle']:
            obj['size'] =  [random.uniform(5, 15), random.uniform(5, 15), random.uniform(5, 15)]
            obj['r'] = random.uniform(0.5, 5)
        elif obj['shape'] == 'sphere':
            obj['r'] = random.uniform(5, 15)
        elif obj['shape'] in ['cylinder', 'hole']:
            obj['r'] = random.uniform(0.5, 5)
            obj['h'] = random.uniform(5, 15)
        elif obj['shape'] == 'slot':
            obj['r'] = random.uniform(0.5, 5)
            obj['h'] = random.uniform(5, 15)
            obj['w'] = random.uniform(5, 15)
        
        # Set a random position and rotation
        obj['pos'] = [random.uniform(-20, 20), random.uniform(-20, 20), random.uniform(-20, 20)]
        obj['rot'] = [random.uniform(-180, 180), random.uniform(-180, 180), random.uniform(-180, 180)]
        
        # Add the object to the list
        objects.append(obj)
    return objects

####### old file saving
def saveToAll(fileIn):
    saveToDxf(fileIn)
    saveToPng(fileIn)
    saveToStl(fileIn)
    saveToSvg(fileIn)

def saveToDxf(fileIn, fileOut="", copy_to_laser=True):
    if fileOut == "":
        fileOut = fileIn.replace(".scad",".dxf")
    saveToFile(fileIn, fileOut)


    
def saveToPng(fileIn, fileOut="",extra="--render"):
    if fileOut == "":
        fileOut = fileIn.replace(".scad",".png")
    saveToFile(fileIn, fileOut)

def saveToStl(fileIn, fileOut=""):
    if fileOut == "":
        fileOut = fileIn.replace(".scad",".stl")
    saveToFile(fileIn, fileOut)
    
def saveToSvg(fileIn, fileOut=""):
    if fileOut == "":
        fileOut = fileIn.replace(".scad",".svg")
    saveToFile(fileIn, fileOut)

def saveToFile(fileIn, fileOut,extra=""):
    #extra = extra + " --colorscheme Tomorrow"

    launchStr = 'openscad -o "' + fileOut + '"' + extra + ' "' + fileIn + '"'
    if ".png" in fileOut:
        launchStr = launchStr + " --render"
    print("            saveToFile launch string: " + launchStr)
    subprocess.run(launchStr)
    x=0

def getLaser(final_object,start=1.5,layers=1,thickness=3,tilediff=200):
        rv= []

        for x in range(layers):
            rv.append(translate([0,x*tilediff,0])(
                    projection()(
                        intersection()(translate([-500,-500,start+x*thickness])(cube(size=[1000,1000,0.1])),
                            final_object
                        )
                    )
            )
            )
            
        return union()(rv)

set_mode("laser")
load_scad_objects() 
 
************************************************/
